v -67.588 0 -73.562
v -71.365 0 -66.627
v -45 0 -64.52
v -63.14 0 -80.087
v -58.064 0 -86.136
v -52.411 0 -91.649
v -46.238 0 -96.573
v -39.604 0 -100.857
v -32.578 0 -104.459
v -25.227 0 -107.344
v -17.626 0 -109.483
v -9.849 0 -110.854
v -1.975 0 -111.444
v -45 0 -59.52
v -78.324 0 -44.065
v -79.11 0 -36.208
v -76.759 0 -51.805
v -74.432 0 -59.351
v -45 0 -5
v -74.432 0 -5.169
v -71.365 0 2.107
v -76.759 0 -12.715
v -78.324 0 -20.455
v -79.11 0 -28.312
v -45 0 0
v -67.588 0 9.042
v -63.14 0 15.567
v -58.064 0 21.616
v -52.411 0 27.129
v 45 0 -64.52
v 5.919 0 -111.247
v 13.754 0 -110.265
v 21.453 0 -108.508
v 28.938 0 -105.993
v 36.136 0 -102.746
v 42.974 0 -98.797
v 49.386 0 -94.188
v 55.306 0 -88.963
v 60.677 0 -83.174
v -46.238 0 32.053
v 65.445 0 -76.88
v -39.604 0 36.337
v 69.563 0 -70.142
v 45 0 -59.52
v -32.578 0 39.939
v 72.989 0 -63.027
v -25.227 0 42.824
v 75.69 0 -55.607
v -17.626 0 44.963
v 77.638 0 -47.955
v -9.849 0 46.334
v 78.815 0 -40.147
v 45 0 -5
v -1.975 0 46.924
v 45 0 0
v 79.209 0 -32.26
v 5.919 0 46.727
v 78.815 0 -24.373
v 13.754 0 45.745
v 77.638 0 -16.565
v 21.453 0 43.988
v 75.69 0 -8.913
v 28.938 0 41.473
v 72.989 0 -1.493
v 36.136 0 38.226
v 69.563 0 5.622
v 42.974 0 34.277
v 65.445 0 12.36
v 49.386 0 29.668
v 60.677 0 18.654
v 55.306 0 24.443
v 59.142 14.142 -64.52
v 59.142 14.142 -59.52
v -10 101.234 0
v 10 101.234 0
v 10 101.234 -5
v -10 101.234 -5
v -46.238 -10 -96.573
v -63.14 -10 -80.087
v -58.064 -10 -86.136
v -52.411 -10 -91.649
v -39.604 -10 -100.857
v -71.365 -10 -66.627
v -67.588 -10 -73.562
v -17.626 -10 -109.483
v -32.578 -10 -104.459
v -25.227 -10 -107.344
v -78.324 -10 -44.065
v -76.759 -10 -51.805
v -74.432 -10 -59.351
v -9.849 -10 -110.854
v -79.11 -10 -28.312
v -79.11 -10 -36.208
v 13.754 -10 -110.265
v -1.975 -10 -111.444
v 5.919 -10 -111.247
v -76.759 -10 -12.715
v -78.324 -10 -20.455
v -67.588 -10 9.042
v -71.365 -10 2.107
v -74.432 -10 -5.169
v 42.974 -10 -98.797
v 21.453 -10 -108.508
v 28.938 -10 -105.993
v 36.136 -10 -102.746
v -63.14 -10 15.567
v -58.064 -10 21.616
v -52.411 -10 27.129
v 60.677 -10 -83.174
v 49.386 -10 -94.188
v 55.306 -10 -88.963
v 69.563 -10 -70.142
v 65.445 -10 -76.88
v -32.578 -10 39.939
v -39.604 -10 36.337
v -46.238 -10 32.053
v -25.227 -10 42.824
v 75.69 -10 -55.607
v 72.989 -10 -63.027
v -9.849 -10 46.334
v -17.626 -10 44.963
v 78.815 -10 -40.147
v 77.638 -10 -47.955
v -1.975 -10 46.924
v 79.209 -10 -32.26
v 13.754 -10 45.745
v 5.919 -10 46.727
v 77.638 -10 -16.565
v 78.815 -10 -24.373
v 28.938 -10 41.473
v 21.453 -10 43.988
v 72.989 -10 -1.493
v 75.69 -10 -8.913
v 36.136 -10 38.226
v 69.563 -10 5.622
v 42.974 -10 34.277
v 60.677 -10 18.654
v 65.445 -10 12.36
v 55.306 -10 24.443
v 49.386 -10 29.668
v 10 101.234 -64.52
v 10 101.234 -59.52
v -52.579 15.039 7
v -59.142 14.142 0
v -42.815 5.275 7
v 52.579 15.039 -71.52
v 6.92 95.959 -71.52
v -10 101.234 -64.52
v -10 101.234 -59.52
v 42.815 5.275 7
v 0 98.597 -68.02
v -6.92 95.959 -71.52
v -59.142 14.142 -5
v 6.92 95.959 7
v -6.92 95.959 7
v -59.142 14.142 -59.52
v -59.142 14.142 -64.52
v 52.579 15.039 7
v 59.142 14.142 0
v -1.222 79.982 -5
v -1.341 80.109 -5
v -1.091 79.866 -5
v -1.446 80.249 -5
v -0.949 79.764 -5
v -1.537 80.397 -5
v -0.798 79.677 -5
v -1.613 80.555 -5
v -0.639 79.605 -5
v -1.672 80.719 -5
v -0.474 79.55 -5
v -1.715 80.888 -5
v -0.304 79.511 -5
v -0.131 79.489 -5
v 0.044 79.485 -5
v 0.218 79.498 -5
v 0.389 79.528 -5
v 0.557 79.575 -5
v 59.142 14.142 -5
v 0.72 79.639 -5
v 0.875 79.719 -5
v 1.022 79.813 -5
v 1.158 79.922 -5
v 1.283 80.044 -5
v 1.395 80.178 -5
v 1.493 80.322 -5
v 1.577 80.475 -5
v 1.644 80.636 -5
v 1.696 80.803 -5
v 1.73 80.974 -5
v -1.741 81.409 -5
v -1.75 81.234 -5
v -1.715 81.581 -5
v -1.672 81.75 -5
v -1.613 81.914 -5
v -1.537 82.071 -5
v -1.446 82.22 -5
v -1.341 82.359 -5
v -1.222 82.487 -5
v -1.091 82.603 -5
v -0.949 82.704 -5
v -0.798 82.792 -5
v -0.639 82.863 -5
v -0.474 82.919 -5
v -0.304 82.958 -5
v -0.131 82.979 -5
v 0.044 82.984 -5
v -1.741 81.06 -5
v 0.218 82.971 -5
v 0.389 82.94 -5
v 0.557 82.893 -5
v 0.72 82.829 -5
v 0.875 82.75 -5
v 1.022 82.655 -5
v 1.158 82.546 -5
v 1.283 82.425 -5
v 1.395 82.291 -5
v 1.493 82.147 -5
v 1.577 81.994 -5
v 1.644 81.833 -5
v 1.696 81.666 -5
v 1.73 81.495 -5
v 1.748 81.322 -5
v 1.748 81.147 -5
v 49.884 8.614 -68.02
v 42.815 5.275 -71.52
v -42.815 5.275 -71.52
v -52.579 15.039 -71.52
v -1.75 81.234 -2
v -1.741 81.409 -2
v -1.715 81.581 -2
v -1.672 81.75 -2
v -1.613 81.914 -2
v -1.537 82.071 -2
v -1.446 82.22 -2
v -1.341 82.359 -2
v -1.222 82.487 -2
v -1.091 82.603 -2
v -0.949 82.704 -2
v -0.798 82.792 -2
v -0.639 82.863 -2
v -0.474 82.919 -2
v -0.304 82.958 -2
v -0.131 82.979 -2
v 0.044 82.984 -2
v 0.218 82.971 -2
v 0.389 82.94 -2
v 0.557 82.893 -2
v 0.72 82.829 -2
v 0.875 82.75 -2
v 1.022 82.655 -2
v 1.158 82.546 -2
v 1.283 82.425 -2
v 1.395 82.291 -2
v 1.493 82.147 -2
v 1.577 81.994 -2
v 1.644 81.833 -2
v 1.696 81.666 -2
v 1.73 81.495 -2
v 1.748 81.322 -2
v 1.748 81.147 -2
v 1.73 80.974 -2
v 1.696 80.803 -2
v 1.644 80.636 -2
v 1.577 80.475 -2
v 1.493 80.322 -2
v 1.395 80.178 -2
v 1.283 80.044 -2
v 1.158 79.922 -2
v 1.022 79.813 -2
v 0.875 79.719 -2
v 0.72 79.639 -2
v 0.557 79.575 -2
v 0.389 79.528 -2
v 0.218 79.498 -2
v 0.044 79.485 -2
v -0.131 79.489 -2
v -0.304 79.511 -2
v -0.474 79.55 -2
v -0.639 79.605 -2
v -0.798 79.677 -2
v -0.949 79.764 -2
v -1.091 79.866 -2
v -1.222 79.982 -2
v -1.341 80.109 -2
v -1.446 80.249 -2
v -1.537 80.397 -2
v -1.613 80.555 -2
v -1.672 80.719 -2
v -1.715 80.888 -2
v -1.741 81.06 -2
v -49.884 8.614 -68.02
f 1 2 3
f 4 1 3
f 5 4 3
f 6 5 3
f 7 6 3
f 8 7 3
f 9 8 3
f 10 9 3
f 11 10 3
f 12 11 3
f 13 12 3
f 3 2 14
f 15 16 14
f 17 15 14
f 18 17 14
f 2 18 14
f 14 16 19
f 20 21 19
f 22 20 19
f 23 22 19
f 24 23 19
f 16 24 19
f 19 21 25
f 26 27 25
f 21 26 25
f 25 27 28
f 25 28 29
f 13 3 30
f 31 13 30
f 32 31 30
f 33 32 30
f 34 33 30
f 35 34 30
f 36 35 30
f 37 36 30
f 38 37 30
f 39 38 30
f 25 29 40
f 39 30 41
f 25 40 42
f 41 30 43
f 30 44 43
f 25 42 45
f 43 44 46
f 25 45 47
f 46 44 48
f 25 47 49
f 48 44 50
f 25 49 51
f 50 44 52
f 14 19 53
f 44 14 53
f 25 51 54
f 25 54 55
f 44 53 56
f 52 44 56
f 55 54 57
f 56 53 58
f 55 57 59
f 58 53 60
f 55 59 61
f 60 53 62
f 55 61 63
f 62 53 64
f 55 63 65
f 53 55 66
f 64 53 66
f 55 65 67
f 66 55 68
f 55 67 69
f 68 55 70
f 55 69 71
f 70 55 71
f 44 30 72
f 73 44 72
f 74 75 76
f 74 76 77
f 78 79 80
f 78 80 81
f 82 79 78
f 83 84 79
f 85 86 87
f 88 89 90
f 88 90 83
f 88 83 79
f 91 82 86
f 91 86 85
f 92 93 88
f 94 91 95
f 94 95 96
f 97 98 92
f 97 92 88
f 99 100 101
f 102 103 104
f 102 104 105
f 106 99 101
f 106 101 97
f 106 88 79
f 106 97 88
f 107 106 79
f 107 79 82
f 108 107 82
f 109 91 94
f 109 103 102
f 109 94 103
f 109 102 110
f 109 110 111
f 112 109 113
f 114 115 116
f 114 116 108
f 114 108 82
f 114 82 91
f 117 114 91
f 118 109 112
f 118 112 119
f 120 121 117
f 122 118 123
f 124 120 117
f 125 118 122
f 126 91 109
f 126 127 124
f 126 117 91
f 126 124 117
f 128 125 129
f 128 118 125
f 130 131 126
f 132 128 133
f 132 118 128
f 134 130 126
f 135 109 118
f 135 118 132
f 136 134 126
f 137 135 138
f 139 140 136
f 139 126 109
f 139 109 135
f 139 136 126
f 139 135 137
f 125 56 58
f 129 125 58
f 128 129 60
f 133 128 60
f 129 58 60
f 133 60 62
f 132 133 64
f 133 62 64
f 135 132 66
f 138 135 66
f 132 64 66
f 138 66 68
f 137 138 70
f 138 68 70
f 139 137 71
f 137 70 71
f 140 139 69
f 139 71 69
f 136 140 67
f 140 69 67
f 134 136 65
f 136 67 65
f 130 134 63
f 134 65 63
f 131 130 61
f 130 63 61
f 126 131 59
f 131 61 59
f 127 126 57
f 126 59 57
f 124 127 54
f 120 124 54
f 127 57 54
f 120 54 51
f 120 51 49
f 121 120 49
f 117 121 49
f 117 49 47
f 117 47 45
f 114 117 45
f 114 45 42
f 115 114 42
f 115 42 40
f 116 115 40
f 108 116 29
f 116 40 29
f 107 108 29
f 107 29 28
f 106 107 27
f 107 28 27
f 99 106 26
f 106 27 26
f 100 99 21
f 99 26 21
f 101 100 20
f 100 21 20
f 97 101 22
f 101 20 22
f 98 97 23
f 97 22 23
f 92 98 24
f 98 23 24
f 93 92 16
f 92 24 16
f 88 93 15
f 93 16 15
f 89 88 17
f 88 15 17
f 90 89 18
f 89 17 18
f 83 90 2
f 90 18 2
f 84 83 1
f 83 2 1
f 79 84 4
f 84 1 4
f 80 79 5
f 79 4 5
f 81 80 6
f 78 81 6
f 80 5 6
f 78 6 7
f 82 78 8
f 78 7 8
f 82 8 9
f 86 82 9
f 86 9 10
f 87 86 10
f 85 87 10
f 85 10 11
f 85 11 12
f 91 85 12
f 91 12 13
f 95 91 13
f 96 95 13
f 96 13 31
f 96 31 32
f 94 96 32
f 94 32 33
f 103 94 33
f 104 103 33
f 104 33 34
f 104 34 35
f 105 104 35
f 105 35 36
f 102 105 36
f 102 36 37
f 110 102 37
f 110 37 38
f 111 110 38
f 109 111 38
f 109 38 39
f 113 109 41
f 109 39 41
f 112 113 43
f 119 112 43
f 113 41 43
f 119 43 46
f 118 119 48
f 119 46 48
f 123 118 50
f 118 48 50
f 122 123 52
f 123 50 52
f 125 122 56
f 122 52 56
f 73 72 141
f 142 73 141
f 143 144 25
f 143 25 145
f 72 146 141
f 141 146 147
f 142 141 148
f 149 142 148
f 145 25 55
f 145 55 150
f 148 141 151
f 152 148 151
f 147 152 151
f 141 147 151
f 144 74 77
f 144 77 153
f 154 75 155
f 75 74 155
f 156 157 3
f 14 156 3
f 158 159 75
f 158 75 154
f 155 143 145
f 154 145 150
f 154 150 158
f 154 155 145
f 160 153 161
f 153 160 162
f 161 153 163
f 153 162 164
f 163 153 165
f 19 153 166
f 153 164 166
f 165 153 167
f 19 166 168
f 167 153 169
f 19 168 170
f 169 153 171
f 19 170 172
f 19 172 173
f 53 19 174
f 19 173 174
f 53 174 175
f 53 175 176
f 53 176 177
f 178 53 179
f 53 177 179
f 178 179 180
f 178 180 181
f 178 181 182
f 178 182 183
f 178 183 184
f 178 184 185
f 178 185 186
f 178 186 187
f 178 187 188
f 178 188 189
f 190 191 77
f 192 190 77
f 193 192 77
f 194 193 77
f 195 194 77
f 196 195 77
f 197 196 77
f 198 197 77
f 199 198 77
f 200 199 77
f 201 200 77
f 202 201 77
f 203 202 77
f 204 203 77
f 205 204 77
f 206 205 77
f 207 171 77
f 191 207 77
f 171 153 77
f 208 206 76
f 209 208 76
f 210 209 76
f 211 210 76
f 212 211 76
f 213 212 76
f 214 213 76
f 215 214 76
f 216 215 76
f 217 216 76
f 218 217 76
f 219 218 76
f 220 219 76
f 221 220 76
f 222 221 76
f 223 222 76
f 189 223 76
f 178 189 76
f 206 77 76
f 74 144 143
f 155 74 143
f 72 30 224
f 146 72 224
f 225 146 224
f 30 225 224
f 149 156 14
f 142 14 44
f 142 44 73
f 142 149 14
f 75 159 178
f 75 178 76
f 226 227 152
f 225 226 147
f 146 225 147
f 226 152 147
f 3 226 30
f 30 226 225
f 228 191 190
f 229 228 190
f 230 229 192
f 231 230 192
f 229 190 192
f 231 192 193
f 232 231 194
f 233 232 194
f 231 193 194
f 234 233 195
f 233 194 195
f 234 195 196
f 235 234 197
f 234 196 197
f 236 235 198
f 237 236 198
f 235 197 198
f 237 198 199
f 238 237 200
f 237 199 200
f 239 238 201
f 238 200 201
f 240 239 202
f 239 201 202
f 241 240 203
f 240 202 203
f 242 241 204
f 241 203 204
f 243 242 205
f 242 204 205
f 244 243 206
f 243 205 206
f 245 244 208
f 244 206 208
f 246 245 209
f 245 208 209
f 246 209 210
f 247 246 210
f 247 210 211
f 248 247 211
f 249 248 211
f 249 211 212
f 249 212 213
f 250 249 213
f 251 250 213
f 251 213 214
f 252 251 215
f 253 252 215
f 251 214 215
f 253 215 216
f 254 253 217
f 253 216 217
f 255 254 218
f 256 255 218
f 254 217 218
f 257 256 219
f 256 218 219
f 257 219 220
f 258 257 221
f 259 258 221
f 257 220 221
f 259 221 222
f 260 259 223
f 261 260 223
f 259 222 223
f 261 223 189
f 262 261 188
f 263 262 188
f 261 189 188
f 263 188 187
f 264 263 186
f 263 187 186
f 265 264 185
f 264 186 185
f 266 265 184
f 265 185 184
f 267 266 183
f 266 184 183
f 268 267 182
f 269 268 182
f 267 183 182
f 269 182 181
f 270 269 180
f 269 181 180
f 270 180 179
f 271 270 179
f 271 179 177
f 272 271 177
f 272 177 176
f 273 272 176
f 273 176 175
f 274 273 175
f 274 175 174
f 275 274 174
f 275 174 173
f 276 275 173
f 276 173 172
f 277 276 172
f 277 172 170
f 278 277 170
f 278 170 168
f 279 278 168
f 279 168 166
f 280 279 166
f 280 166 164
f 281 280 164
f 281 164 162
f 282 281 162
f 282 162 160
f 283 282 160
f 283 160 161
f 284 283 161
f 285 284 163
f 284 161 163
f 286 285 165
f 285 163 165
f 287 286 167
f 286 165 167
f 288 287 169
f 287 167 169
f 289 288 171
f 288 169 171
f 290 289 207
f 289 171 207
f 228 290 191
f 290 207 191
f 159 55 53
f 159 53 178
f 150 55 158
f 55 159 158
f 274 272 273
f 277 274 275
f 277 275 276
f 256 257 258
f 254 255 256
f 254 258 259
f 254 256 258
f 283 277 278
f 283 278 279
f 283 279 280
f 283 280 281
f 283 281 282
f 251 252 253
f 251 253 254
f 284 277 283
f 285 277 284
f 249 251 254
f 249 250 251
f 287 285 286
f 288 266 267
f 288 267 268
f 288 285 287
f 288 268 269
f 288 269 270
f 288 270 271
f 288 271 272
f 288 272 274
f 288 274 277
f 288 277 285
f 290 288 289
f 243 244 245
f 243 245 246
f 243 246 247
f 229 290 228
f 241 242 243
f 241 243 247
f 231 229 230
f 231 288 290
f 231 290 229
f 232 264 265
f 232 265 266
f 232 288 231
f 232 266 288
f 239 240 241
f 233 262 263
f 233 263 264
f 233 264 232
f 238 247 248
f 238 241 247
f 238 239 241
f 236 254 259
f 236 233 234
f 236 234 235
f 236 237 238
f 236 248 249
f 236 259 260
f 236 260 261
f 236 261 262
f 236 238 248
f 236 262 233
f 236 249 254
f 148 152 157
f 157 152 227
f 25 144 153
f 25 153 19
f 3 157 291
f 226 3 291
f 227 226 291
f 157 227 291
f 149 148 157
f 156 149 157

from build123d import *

# Parameters (mm, degrees)
BOSS_EXTRUDE1_DEPTH           = 7
BOSS_EXTRUDE1_TAPER           = 37
BOSS_EXTRUDE1_OTHER_WAY_DEPTH = 5
SKETCH2_R                     = 1.75
CUT_EXTRUDE1_DEPTH            = 3
SKETCH3_R                     = 79.208746666
BOSS_EXTRUDE2_DEPTH           = 10
MIRROR1_START                 = -64.52
MIRROR1_DEPTH                 = 5


with BuildPart() as part:
    # Sketch1 → Boss-Extrude1 (new body)
    with BuildSketch(Plane.XY):
        Polygon((-10, 101.234331062), (-59.142135624, 14.142135624), (-45, 0), (45, 0), (59.142135624, 14.142135624), (10, 101.234331062), align=None)
    extrude(amount=BOSS_EXTRUDE1_DEPTH, taper=BOSS_EXTRUDE1_TAPER)

    # Sketch1 → Boss-Extrude1 other way (add)
    with BuildSketch(Plane.XY):
        Polygon((-10, 101.234331062), (-59.142135624, 14.142135624), (-45, 0), (45, 0), (59.142135624, 14.142135624), (10, 101.234331062), align=None)
    extrude(amount=-BOSS_EXTRUDE1_OTHER_WAY_DEPTH)

    # Sketch2 → Cut-Extrude1 (cut)
    with BuildSketch(Plane(origin=(0, 0, -5), x_dir=(-1, 0, 0), z_dir=(0, 0, -1))):
        with Locations((0, 81.234331062)):
            Circle(SKETCH2_R)
    extrude(amount=-CUT_EXTRUDE1_DEPTH, mode=Mode.SUBTRACT)

    # Sketch3 → Boss-Extrude2 (add)
    with BuildSketch(Plane.XZ):
        with Locations((0, -32.26)):
            Circle(SKETCH3_R)
    extrude(amount=BOSS_EXTRUDE2_DEPTH)

    # Mirror1: read off the stored shape, not the designer's step
    # Mirror1 outline → Mirror1 (add)
    with BuildSketch(Plane.XY.offset(MIRROR1_START)):
        Polygon((-10, 101.234331062), (-59.142135624, 14.142135624), (-45, 0), (45, 0), (59.142135624, 14.142135624), (10, 101.234331062), align=None)
    extrude(amount=MIRROR1_DEPTH)

    # Mirror1 2: loft between two sections, ruled curve by curve
    mirror1_2_from = [
        Edge.make_line((-10, 101.234331062, -64.52), (-59.142135624, 14.142135624, -64.52)),
        Edge.make_line((10, 101.234331062, -64.52), (-10, 101.234331062, -64.52)),
        Edge.make_line((59.142135624, 14.142135624, -64.52), (10, 101.234331062, -64.52)),
        Edge.make_line((45, 0, -64.52), (59.142135624, 14.142135624, -64.52)),
        Edge.make_line((-45, 0, -64.52), (45, 0, -64.52)),
        Edge.make_line((-59.142135624, 14.142135624, -64.52), (-45, 0, -64.52)),
    ]
    mirror1_2_to = [
        Edge.make_line((-6.919711963, 95.959452712, -71.52), (-52.579336418, 15.039140921, -71.52)),
        Edge.make_line((6.919711963, 95.959452712, -71.52), (-6.919711963, 95.959452712, -71.52)),
        Edge.make_line((52.579336418, 15.039140921, -71.52), (6.919711963, 95.959452712, -71.52)),
        Edge.make_line((42.815073847, 5.274878351, -71.52), (52.579336418, 15.039140921, -71.52)),
        Edge.make_line((-42.815073847, 5.274878351, -71.52), (42.815073847, 5.274878351, -71.52)),
        Edge.make_line((-52.579336418, 15.039140921, -71.52), (-42.815073847, 5.274878351, -71.52)),
    ]
    mirror1_2 = Solid(Shell([*[Face.make_surface_from_curves(mirror1_2_from[k], mirror1_2_to[k]) for k in range(6)], Face(Wire(mirror1_2_from)), Face(Wire(mirror1_2_to))]))
    add(mirror1_2)


solid = part.part
